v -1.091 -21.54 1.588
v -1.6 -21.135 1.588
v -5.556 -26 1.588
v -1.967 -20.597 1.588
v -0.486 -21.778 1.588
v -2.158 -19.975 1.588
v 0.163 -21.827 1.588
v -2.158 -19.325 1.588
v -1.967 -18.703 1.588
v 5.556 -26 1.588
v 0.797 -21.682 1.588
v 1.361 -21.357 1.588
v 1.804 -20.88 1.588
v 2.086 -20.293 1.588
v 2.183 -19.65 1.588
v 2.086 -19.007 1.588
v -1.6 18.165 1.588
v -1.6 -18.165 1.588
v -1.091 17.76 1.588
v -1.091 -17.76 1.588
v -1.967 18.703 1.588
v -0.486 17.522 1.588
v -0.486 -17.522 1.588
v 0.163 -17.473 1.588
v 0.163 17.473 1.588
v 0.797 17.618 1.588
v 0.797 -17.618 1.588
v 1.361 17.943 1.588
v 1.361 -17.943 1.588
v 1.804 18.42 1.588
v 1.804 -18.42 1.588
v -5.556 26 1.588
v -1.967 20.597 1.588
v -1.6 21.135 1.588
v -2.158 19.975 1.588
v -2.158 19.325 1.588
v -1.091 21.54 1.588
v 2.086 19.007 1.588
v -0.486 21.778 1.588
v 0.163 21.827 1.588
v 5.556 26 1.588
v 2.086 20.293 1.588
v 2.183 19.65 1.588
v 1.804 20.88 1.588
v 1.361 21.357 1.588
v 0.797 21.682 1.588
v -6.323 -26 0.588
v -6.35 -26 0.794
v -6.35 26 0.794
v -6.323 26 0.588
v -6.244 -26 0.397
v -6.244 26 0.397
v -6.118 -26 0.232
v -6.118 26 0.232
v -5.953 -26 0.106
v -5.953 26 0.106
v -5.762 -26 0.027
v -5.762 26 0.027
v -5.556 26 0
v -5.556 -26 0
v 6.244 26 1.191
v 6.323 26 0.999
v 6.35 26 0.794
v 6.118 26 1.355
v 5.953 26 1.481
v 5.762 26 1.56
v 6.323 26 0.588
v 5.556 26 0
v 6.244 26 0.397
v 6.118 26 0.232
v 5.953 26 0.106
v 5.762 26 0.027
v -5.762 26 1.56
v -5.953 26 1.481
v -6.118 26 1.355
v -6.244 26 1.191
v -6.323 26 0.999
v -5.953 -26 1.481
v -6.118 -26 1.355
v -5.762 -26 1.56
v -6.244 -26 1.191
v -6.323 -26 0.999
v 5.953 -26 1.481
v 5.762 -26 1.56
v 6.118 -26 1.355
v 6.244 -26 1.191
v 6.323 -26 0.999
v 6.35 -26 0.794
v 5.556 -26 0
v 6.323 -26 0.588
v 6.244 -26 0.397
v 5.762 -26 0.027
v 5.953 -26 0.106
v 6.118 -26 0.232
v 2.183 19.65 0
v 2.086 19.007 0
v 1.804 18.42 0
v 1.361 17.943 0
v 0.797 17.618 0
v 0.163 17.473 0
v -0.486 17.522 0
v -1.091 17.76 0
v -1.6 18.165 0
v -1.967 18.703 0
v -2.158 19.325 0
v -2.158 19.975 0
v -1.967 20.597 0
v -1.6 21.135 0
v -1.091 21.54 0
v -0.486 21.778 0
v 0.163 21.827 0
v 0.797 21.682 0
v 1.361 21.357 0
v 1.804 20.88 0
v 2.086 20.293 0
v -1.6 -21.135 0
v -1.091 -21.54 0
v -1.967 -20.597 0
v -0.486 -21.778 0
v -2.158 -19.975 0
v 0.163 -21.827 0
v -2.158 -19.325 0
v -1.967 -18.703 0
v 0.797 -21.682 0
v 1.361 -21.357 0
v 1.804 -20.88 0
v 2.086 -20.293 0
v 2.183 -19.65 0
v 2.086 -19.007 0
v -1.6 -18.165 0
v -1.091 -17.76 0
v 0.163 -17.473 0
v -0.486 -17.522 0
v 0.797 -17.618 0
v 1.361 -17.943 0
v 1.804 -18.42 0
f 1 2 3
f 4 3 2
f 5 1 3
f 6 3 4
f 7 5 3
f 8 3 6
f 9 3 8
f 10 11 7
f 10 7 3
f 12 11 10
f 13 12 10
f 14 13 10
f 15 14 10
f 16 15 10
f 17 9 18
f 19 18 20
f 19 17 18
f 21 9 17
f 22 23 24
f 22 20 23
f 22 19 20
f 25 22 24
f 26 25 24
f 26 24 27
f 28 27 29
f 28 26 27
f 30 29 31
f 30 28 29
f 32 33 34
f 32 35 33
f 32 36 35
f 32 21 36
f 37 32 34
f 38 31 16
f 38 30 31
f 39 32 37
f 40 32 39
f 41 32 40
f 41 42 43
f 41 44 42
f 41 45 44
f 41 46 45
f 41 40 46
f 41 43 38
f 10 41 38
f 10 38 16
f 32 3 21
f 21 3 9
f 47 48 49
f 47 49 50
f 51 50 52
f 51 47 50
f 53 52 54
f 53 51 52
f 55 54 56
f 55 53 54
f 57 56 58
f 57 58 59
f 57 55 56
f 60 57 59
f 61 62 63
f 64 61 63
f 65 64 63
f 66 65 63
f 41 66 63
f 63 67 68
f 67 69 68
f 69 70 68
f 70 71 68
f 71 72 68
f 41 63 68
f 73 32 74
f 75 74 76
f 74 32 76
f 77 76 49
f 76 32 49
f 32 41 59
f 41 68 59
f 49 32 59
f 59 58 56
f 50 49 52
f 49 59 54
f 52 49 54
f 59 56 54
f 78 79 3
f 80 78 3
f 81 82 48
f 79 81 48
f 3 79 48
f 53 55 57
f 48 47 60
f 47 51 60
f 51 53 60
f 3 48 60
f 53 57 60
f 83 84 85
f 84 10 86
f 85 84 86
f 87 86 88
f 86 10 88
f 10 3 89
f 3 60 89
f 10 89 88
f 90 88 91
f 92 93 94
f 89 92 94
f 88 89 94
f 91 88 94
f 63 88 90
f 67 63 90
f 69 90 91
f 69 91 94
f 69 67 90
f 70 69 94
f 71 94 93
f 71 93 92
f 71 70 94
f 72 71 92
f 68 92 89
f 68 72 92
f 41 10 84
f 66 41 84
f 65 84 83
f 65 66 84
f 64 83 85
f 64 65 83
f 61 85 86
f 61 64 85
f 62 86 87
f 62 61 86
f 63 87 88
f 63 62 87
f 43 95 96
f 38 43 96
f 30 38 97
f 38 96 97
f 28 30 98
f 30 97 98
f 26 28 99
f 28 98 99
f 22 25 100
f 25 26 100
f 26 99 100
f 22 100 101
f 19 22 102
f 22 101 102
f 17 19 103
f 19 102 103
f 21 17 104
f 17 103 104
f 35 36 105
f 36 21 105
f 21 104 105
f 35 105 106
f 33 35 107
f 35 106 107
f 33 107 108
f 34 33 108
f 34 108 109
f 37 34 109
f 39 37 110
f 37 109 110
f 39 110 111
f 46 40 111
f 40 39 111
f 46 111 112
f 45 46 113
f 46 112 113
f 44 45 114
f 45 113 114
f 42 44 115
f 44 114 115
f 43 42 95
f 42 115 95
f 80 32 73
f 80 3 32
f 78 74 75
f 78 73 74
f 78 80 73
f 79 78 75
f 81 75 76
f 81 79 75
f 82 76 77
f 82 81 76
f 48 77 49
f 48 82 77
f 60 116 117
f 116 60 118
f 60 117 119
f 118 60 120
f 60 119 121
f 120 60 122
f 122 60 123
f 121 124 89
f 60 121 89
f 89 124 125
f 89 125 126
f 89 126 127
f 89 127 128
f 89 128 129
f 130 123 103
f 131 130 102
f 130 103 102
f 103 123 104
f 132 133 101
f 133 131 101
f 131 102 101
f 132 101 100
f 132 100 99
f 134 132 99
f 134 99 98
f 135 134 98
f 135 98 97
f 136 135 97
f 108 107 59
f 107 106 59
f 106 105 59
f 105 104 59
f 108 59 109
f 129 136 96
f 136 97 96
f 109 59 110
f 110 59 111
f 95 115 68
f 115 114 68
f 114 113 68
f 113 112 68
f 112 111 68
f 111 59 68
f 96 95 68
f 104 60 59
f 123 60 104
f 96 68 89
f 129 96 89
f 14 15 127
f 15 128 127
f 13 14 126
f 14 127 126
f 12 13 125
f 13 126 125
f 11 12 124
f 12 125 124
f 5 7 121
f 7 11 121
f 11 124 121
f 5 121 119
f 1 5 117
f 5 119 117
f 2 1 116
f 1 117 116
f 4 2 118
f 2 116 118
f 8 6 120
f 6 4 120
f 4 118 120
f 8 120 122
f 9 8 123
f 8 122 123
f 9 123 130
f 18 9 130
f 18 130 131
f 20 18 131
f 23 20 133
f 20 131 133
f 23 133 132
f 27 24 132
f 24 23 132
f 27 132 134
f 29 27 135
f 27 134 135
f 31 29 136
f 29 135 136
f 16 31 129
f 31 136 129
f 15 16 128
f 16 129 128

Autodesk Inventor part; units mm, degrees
ref_plane "YZ Plane" through (0, 0, 0) normal (1, 0, 0) x (0, 1, 0)
ref_plane "XZ Plane" through (0, 0, 0) normal (0, 1, 0) x (-1, 0, 0)
ref_plane "XY Plane" through (0, 0, 0) normal (0, 0, 1) x (1, 0, 0)
sketch "Sketch1" plane through (0, 0, 0) normal (0, 0, 1) x (1, 0, 0)
  circle A0 centre (0, 19.65) radius 2.1828
  circle A1 centre (0, -19.65) radius 2.1828
  line L0 (-6.35, -26) -> (6.35, -26)
  line L1 (6.35, -26) -> (6.35, 26)
  line L2 (6.35, 26) -> (-6.35, 26)
  line L3 (-6.35, 26) -> (-6.35, -26)
  line L4 (-6.35, -26) -> (6.35, 26) construction
  line L5 (6.35, -26) -> (-6.35, 26) construction
  point P0 (0, 0)
  dimension "d0" = 4.3656
  dimension "d1" = 4.3656
  dimension "d2" = 19.65
  dimension "d3" = 39.3
  dimension "d4" = 19.65
  dimension "d5" = 12.7
  dimension "d6" = 6.35
extrude "Extrusion1" add sketch "Sketch1" along normal blind 1.5875
fillet "Fillet1" radius 0.7937 4 edges at (-6.35, 0, 0) (-6.35, 0, 1.5875) (6.35, 0, 0) (6.35, 0, 1.5875)
properties part number "Part C"
